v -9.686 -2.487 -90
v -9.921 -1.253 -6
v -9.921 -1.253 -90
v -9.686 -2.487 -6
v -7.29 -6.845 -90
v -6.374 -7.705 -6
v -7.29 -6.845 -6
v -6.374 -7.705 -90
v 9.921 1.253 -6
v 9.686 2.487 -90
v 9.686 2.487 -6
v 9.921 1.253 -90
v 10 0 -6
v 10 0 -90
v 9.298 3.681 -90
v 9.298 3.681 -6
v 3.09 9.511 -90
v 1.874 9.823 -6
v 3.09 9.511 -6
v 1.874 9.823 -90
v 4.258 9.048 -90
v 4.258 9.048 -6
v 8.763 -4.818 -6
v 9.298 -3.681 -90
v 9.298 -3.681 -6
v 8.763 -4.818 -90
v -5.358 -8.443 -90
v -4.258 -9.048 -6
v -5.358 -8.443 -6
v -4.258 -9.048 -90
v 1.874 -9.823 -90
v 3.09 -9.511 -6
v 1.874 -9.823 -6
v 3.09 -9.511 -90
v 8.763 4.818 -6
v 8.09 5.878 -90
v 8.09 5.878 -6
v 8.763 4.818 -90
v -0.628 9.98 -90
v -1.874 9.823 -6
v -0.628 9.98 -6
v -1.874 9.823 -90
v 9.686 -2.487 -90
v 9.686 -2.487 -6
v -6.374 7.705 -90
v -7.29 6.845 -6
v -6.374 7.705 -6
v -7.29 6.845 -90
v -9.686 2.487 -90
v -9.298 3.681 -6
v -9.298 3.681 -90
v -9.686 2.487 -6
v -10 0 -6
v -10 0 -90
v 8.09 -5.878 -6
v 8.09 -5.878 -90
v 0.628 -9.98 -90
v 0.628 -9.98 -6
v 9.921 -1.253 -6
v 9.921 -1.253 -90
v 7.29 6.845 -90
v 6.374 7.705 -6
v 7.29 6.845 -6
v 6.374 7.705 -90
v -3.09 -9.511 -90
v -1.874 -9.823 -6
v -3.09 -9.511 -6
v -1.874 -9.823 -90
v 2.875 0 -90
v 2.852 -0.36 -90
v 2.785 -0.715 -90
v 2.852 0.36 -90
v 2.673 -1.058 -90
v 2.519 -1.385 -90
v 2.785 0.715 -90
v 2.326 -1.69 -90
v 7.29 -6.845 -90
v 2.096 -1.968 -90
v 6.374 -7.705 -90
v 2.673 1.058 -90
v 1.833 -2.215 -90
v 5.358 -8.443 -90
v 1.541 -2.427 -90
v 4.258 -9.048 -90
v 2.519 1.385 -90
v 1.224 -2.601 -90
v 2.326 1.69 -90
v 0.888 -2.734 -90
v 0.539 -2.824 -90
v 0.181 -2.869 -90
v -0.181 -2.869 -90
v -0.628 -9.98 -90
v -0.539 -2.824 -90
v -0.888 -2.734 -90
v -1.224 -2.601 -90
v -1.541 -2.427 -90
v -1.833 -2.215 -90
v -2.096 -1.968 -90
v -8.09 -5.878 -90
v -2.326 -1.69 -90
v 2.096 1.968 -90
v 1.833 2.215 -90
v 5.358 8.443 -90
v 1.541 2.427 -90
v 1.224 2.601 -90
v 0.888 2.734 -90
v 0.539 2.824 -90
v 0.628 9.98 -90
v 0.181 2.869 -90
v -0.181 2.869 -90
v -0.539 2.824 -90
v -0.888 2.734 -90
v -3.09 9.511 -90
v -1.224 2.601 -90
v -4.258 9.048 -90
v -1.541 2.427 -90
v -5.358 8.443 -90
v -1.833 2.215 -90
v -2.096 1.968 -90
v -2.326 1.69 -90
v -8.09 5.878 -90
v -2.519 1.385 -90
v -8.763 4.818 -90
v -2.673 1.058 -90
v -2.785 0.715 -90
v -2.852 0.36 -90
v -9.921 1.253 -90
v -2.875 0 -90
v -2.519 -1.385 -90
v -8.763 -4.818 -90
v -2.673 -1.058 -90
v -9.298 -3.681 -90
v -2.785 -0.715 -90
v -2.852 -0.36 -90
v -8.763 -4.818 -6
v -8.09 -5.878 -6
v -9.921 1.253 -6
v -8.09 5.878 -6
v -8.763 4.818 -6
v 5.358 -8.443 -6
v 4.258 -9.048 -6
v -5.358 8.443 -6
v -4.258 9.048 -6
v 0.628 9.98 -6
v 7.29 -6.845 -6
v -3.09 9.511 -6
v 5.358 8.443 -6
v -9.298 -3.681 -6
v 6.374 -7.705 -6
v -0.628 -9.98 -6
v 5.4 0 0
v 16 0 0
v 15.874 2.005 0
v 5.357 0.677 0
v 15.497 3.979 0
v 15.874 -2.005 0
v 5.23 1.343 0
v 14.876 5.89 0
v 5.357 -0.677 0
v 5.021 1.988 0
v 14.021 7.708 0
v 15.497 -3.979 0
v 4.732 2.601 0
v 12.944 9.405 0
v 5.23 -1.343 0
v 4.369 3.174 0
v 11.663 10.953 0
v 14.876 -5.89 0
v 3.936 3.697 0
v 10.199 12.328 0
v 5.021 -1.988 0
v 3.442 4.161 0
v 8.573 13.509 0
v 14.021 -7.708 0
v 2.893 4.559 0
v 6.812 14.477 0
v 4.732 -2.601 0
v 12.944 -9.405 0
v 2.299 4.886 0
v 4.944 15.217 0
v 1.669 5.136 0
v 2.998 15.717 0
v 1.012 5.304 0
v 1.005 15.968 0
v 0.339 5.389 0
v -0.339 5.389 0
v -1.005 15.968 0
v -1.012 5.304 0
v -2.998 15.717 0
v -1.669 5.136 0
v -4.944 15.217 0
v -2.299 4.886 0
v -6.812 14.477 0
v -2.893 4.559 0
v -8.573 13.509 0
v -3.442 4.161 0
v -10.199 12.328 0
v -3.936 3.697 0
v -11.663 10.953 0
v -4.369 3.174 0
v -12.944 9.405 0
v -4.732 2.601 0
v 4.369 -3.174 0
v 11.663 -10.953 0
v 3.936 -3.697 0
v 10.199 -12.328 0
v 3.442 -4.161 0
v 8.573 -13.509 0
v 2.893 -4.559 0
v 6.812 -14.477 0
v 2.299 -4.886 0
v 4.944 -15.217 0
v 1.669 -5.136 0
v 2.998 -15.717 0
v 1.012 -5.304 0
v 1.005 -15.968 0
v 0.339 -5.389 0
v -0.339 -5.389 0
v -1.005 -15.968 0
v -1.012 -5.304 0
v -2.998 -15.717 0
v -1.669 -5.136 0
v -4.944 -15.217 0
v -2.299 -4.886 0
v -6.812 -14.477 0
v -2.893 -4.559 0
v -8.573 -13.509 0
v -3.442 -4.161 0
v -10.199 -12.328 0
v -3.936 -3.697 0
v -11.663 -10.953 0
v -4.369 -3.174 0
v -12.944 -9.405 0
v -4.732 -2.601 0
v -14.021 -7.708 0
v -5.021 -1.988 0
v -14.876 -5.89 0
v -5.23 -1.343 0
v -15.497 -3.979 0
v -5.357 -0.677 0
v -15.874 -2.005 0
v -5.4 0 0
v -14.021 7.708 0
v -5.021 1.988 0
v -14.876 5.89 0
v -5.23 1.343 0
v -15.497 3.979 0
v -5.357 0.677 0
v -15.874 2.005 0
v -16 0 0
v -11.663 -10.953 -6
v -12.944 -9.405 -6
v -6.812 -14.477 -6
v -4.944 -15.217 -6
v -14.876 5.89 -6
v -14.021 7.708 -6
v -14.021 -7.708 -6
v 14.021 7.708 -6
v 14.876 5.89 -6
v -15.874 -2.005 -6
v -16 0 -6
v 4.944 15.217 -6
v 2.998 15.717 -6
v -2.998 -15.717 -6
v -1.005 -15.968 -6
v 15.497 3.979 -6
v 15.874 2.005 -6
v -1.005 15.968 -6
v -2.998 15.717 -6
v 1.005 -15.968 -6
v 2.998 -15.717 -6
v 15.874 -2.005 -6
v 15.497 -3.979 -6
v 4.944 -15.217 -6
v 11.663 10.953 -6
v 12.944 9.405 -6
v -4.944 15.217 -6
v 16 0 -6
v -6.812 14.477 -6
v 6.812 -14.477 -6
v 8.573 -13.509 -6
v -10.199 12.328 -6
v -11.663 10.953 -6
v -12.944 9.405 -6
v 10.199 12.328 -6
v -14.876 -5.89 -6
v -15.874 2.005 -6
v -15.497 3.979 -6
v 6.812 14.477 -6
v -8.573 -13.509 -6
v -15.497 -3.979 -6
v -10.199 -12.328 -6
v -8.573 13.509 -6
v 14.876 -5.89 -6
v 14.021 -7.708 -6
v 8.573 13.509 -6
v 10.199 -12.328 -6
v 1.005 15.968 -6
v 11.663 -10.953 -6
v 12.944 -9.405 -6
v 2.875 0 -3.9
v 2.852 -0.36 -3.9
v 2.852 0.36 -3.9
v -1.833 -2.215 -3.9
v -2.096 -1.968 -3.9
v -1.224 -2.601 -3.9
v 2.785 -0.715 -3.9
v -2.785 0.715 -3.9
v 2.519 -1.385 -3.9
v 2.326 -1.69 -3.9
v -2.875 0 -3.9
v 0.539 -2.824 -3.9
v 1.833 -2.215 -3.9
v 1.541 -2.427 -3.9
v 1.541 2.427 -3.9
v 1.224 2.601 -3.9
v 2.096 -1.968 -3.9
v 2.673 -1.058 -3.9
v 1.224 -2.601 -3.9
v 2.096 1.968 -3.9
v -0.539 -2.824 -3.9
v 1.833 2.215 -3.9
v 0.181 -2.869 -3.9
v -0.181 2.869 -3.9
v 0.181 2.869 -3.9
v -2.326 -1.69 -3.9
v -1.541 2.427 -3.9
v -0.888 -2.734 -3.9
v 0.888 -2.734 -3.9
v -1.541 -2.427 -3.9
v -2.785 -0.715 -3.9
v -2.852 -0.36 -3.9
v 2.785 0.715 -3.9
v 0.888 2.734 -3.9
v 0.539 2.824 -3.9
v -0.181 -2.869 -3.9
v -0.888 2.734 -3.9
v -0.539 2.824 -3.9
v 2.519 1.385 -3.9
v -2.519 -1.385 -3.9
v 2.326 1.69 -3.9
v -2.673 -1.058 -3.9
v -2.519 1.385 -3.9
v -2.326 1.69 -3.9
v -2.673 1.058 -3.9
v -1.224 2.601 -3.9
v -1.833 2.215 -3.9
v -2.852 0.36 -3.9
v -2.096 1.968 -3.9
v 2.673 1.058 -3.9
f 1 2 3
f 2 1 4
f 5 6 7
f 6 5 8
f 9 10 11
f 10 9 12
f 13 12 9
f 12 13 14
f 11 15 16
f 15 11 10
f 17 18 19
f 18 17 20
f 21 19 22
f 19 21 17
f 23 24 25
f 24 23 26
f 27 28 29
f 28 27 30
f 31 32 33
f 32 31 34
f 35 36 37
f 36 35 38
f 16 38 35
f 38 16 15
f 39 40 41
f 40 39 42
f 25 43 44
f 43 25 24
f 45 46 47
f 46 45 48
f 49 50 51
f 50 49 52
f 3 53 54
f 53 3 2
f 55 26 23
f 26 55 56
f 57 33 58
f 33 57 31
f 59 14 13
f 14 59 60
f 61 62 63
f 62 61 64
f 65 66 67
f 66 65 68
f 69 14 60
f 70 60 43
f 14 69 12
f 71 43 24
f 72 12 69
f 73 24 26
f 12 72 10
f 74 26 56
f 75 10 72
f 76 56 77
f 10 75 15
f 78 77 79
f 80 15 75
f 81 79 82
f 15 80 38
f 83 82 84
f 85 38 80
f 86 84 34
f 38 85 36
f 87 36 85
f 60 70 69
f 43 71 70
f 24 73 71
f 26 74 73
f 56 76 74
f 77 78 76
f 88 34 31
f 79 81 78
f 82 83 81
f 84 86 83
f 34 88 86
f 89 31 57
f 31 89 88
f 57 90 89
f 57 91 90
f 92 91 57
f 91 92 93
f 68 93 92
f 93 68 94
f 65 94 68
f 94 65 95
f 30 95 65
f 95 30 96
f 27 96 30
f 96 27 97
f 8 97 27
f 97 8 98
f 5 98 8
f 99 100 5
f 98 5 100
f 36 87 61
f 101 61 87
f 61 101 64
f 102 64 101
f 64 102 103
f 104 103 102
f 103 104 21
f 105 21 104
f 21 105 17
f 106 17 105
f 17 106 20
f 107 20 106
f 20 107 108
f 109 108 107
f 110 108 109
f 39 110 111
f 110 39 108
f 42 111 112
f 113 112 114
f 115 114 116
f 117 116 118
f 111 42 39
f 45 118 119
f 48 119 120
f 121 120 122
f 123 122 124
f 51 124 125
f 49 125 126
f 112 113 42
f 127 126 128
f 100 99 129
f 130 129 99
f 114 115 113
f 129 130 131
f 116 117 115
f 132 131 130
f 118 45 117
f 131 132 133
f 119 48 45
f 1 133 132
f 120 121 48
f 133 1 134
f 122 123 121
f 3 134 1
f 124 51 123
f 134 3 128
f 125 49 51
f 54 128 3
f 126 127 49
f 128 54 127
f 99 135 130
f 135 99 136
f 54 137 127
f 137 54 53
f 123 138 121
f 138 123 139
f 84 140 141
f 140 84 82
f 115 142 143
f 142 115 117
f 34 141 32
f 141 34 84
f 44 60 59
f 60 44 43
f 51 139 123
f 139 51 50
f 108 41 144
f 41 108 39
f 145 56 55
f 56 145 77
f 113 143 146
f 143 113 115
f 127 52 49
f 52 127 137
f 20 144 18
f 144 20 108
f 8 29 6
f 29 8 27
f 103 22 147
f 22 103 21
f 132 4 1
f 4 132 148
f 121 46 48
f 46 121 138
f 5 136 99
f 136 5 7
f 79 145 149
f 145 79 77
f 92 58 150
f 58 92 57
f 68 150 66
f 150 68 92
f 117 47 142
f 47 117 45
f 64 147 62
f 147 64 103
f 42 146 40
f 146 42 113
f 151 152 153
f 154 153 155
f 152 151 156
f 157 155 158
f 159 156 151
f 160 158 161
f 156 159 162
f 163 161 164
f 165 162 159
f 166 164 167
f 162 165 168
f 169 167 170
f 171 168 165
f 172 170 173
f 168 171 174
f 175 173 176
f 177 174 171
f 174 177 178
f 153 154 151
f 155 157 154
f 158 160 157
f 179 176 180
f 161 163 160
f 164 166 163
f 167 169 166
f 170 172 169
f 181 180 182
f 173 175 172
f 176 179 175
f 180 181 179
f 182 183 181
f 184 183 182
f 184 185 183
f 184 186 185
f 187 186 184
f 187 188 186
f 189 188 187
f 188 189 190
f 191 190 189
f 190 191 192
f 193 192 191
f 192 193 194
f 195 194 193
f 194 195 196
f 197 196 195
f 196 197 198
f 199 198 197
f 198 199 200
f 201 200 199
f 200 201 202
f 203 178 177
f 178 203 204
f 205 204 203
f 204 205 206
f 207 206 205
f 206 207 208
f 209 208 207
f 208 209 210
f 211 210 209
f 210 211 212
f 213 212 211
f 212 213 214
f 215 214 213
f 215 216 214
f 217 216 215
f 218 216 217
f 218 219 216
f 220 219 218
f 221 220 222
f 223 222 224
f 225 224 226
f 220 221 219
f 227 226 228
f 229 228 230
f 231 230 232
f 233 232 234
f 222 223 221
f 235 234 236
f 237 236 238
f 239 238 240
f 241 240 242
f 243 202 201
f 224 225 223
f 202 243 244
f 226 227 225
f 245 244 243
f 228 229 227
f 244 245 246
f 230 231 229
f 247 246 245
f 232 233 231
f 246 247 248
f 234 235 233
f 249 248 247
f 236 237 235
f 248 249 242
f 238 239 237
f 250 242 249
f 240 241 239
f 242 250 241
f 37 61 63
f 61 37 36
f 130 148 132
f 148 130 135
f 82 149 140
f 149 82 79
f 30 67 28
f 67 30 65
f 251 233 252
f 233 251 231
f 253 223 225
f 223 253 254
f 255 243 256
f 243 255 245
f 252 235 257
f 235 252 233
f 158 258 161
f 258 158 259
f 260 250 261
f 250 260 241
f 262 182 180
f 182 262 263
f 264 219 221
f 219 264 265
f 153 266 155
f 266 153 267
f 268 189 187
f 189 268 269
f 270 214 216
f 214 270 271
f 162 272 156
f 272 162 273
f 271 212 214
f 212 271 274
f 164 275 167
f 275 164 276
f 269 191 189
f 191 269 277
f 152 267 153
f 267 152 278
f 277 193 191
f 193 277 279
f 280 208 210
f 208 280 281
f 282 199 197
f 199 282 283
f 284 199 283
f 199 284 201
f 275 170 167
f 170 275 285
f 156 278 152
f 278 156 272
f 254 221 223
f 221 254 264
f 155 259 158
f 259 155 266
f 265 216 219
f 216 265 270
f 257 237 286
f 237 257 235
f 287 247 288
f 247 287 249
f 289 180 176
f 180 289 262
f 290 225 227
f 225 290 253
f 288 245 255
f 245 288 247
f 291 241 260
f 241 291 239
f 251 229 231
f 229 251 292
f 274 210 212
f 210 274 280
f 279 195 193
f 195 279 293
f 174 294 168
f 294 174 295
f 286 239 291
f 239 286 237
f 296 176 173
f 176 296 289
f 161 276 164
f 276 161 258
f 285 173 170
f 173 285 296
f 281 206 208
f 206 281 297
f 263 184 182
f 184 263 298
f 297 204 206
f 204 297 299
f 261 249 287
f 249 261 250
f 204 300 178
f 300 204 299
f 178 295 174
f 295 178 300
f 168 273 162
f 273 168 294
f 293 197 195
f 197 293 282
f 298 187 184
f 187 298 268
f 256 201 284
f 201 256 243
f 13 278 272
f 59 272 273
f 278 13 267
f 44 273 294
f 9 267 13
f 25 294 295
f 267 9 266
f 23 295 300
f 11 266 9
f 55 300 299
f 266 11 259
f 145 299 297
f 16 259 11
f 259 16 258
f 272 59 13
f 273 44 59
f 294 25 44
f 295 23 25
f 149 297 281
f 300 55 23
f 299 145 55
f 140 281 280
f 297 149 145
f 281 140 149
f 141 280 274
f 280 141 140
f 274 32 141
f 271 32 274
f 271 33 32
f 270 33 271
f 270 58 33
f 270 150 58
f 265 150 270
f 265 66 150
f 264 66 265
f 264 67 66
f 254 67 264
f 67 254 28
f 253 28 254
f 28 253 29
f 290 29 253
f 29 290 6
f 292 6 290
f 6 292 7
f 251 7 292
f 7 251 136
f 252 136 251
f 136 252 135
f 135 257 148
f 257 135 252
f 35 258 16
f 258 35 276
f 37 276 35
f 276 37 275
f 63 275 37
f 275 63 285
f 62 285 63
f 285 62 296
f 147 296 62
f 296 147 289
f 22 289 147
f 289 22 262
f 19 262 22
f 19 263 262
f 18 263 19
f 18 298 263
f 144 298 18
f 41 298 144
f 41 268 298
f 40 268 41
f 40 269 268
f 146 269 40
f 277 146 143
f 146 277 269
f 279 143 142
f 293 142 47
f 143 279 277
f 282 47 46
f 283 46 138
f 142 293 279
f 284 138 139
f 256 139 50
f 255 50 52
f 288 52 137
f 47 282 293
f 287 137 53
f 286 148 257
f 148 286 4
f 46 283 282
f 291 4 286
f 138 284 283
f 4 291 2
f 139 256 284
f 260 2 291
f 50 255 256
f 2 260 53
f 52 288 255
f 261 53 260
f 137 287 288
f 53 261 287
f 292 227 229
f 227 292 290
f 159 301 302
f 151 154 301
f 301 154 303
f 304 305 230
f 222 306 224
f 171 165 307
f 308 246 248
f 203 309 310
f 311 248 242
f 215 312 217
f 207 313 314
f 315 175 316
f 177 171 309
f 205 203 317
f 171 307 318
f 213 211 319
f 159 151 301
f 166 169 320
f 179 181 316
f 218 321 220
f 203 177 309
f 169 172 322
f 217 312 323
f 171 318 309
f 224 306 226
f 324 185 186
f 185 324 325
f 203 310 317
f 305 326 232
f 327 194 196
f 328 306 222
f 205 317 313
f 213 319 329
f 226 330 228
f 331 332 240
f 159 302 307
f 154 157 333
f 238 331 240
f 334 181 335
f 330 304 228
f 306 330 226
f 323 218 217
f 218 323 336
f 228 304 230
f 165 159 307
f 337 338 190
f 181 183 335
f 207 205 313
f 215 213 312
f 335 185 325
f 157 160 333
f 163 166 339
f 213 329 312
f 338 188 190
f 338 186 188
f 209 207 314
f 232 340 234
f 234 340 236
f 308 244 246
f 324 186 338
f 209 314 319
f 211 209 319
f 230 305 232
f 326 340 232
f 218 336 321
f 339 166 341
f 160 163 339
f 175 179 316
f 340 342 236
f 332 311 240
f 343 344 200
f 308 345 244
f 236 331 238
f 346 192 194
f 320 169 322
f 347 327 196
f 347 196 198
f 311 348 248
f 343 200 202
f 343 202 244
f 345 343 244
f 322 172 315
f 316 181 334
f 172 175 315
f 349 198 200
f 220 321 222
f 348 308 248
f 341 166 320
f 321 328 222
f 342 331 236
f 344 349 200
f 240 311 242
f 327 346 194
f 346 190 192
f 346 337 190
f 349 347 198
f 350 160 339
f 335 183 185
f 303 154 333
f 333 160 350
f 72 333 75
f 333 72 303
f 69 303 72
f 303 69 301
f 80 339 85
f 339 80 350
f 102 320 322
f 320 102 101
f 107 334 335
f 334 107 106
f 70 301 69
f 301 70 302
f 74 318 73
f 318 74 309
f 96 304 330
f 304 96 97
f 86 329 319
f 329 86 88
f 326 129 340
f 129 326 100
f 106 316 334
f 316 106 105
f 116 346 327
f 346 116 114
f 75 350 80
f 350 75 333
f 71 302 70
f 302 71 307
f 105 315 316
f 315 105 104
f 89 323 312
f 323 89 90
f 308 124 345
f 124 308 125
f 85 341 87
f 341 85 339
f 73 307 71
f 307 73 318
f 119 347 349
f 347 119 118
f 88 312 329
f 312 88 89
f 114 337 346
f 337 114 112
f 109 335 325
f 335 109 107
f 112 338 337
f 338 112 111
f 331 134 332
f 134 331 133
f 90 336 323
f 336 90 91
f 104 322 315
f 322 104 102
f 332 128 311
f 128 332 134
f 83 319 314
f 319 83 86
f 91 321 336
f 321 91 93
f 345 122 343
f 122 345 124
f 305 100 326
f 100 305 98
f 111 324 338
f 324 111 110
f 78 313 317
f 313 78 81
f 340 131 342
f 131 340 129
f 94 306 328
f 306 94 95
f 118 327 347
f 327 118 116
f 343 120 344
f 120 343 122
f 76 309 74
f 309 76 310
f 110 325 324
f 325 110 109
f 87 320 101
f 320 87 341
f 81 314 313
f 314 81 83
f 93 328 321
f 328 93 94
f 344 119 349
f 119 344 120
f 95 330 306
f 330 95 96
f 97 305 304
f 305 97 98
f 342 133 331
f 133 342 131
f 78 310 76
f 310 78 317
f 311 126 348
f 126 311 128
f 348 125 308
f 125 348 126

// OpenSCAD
$fn = 50;


difference() {
	union() {
		translate(v = [0, 0, -90.0000000000]) {
			cylinder(h = 90, r = 10.0000000000);
		}
		translate(v = [0, 0, -6.0000000000]) {
			cylinder(h = 6, r = 16.0000000000);
		}
	}
	union() {
		translate(v = [0, 0, 0]) {
			rotate(a = [0, 0, 0]) {
				difference() {
					union() {
						#translate(v = [0, 0, -90.0000000000]) {
							cylinder(h = 90, r = 2.6000000000);
						}
						#translate(v = [0, 0, -3.9000000000]) {
							cylinder(h = 3.9000000000, r = 10.0000000000, r1 = 2.8750000000, r2 = 5.4000000000);
						}
						#translate(v = [0, 0, -90.0000000000]) {
							cylinder(h = 90, r = 2.8750000000);
						}
						#translate(v = [0, 0, -90.0000000000]) {
							cylinder(h = 90, r = 2.6000000000);
						}
					}
					union();
				}
			}
		}
	}
}
